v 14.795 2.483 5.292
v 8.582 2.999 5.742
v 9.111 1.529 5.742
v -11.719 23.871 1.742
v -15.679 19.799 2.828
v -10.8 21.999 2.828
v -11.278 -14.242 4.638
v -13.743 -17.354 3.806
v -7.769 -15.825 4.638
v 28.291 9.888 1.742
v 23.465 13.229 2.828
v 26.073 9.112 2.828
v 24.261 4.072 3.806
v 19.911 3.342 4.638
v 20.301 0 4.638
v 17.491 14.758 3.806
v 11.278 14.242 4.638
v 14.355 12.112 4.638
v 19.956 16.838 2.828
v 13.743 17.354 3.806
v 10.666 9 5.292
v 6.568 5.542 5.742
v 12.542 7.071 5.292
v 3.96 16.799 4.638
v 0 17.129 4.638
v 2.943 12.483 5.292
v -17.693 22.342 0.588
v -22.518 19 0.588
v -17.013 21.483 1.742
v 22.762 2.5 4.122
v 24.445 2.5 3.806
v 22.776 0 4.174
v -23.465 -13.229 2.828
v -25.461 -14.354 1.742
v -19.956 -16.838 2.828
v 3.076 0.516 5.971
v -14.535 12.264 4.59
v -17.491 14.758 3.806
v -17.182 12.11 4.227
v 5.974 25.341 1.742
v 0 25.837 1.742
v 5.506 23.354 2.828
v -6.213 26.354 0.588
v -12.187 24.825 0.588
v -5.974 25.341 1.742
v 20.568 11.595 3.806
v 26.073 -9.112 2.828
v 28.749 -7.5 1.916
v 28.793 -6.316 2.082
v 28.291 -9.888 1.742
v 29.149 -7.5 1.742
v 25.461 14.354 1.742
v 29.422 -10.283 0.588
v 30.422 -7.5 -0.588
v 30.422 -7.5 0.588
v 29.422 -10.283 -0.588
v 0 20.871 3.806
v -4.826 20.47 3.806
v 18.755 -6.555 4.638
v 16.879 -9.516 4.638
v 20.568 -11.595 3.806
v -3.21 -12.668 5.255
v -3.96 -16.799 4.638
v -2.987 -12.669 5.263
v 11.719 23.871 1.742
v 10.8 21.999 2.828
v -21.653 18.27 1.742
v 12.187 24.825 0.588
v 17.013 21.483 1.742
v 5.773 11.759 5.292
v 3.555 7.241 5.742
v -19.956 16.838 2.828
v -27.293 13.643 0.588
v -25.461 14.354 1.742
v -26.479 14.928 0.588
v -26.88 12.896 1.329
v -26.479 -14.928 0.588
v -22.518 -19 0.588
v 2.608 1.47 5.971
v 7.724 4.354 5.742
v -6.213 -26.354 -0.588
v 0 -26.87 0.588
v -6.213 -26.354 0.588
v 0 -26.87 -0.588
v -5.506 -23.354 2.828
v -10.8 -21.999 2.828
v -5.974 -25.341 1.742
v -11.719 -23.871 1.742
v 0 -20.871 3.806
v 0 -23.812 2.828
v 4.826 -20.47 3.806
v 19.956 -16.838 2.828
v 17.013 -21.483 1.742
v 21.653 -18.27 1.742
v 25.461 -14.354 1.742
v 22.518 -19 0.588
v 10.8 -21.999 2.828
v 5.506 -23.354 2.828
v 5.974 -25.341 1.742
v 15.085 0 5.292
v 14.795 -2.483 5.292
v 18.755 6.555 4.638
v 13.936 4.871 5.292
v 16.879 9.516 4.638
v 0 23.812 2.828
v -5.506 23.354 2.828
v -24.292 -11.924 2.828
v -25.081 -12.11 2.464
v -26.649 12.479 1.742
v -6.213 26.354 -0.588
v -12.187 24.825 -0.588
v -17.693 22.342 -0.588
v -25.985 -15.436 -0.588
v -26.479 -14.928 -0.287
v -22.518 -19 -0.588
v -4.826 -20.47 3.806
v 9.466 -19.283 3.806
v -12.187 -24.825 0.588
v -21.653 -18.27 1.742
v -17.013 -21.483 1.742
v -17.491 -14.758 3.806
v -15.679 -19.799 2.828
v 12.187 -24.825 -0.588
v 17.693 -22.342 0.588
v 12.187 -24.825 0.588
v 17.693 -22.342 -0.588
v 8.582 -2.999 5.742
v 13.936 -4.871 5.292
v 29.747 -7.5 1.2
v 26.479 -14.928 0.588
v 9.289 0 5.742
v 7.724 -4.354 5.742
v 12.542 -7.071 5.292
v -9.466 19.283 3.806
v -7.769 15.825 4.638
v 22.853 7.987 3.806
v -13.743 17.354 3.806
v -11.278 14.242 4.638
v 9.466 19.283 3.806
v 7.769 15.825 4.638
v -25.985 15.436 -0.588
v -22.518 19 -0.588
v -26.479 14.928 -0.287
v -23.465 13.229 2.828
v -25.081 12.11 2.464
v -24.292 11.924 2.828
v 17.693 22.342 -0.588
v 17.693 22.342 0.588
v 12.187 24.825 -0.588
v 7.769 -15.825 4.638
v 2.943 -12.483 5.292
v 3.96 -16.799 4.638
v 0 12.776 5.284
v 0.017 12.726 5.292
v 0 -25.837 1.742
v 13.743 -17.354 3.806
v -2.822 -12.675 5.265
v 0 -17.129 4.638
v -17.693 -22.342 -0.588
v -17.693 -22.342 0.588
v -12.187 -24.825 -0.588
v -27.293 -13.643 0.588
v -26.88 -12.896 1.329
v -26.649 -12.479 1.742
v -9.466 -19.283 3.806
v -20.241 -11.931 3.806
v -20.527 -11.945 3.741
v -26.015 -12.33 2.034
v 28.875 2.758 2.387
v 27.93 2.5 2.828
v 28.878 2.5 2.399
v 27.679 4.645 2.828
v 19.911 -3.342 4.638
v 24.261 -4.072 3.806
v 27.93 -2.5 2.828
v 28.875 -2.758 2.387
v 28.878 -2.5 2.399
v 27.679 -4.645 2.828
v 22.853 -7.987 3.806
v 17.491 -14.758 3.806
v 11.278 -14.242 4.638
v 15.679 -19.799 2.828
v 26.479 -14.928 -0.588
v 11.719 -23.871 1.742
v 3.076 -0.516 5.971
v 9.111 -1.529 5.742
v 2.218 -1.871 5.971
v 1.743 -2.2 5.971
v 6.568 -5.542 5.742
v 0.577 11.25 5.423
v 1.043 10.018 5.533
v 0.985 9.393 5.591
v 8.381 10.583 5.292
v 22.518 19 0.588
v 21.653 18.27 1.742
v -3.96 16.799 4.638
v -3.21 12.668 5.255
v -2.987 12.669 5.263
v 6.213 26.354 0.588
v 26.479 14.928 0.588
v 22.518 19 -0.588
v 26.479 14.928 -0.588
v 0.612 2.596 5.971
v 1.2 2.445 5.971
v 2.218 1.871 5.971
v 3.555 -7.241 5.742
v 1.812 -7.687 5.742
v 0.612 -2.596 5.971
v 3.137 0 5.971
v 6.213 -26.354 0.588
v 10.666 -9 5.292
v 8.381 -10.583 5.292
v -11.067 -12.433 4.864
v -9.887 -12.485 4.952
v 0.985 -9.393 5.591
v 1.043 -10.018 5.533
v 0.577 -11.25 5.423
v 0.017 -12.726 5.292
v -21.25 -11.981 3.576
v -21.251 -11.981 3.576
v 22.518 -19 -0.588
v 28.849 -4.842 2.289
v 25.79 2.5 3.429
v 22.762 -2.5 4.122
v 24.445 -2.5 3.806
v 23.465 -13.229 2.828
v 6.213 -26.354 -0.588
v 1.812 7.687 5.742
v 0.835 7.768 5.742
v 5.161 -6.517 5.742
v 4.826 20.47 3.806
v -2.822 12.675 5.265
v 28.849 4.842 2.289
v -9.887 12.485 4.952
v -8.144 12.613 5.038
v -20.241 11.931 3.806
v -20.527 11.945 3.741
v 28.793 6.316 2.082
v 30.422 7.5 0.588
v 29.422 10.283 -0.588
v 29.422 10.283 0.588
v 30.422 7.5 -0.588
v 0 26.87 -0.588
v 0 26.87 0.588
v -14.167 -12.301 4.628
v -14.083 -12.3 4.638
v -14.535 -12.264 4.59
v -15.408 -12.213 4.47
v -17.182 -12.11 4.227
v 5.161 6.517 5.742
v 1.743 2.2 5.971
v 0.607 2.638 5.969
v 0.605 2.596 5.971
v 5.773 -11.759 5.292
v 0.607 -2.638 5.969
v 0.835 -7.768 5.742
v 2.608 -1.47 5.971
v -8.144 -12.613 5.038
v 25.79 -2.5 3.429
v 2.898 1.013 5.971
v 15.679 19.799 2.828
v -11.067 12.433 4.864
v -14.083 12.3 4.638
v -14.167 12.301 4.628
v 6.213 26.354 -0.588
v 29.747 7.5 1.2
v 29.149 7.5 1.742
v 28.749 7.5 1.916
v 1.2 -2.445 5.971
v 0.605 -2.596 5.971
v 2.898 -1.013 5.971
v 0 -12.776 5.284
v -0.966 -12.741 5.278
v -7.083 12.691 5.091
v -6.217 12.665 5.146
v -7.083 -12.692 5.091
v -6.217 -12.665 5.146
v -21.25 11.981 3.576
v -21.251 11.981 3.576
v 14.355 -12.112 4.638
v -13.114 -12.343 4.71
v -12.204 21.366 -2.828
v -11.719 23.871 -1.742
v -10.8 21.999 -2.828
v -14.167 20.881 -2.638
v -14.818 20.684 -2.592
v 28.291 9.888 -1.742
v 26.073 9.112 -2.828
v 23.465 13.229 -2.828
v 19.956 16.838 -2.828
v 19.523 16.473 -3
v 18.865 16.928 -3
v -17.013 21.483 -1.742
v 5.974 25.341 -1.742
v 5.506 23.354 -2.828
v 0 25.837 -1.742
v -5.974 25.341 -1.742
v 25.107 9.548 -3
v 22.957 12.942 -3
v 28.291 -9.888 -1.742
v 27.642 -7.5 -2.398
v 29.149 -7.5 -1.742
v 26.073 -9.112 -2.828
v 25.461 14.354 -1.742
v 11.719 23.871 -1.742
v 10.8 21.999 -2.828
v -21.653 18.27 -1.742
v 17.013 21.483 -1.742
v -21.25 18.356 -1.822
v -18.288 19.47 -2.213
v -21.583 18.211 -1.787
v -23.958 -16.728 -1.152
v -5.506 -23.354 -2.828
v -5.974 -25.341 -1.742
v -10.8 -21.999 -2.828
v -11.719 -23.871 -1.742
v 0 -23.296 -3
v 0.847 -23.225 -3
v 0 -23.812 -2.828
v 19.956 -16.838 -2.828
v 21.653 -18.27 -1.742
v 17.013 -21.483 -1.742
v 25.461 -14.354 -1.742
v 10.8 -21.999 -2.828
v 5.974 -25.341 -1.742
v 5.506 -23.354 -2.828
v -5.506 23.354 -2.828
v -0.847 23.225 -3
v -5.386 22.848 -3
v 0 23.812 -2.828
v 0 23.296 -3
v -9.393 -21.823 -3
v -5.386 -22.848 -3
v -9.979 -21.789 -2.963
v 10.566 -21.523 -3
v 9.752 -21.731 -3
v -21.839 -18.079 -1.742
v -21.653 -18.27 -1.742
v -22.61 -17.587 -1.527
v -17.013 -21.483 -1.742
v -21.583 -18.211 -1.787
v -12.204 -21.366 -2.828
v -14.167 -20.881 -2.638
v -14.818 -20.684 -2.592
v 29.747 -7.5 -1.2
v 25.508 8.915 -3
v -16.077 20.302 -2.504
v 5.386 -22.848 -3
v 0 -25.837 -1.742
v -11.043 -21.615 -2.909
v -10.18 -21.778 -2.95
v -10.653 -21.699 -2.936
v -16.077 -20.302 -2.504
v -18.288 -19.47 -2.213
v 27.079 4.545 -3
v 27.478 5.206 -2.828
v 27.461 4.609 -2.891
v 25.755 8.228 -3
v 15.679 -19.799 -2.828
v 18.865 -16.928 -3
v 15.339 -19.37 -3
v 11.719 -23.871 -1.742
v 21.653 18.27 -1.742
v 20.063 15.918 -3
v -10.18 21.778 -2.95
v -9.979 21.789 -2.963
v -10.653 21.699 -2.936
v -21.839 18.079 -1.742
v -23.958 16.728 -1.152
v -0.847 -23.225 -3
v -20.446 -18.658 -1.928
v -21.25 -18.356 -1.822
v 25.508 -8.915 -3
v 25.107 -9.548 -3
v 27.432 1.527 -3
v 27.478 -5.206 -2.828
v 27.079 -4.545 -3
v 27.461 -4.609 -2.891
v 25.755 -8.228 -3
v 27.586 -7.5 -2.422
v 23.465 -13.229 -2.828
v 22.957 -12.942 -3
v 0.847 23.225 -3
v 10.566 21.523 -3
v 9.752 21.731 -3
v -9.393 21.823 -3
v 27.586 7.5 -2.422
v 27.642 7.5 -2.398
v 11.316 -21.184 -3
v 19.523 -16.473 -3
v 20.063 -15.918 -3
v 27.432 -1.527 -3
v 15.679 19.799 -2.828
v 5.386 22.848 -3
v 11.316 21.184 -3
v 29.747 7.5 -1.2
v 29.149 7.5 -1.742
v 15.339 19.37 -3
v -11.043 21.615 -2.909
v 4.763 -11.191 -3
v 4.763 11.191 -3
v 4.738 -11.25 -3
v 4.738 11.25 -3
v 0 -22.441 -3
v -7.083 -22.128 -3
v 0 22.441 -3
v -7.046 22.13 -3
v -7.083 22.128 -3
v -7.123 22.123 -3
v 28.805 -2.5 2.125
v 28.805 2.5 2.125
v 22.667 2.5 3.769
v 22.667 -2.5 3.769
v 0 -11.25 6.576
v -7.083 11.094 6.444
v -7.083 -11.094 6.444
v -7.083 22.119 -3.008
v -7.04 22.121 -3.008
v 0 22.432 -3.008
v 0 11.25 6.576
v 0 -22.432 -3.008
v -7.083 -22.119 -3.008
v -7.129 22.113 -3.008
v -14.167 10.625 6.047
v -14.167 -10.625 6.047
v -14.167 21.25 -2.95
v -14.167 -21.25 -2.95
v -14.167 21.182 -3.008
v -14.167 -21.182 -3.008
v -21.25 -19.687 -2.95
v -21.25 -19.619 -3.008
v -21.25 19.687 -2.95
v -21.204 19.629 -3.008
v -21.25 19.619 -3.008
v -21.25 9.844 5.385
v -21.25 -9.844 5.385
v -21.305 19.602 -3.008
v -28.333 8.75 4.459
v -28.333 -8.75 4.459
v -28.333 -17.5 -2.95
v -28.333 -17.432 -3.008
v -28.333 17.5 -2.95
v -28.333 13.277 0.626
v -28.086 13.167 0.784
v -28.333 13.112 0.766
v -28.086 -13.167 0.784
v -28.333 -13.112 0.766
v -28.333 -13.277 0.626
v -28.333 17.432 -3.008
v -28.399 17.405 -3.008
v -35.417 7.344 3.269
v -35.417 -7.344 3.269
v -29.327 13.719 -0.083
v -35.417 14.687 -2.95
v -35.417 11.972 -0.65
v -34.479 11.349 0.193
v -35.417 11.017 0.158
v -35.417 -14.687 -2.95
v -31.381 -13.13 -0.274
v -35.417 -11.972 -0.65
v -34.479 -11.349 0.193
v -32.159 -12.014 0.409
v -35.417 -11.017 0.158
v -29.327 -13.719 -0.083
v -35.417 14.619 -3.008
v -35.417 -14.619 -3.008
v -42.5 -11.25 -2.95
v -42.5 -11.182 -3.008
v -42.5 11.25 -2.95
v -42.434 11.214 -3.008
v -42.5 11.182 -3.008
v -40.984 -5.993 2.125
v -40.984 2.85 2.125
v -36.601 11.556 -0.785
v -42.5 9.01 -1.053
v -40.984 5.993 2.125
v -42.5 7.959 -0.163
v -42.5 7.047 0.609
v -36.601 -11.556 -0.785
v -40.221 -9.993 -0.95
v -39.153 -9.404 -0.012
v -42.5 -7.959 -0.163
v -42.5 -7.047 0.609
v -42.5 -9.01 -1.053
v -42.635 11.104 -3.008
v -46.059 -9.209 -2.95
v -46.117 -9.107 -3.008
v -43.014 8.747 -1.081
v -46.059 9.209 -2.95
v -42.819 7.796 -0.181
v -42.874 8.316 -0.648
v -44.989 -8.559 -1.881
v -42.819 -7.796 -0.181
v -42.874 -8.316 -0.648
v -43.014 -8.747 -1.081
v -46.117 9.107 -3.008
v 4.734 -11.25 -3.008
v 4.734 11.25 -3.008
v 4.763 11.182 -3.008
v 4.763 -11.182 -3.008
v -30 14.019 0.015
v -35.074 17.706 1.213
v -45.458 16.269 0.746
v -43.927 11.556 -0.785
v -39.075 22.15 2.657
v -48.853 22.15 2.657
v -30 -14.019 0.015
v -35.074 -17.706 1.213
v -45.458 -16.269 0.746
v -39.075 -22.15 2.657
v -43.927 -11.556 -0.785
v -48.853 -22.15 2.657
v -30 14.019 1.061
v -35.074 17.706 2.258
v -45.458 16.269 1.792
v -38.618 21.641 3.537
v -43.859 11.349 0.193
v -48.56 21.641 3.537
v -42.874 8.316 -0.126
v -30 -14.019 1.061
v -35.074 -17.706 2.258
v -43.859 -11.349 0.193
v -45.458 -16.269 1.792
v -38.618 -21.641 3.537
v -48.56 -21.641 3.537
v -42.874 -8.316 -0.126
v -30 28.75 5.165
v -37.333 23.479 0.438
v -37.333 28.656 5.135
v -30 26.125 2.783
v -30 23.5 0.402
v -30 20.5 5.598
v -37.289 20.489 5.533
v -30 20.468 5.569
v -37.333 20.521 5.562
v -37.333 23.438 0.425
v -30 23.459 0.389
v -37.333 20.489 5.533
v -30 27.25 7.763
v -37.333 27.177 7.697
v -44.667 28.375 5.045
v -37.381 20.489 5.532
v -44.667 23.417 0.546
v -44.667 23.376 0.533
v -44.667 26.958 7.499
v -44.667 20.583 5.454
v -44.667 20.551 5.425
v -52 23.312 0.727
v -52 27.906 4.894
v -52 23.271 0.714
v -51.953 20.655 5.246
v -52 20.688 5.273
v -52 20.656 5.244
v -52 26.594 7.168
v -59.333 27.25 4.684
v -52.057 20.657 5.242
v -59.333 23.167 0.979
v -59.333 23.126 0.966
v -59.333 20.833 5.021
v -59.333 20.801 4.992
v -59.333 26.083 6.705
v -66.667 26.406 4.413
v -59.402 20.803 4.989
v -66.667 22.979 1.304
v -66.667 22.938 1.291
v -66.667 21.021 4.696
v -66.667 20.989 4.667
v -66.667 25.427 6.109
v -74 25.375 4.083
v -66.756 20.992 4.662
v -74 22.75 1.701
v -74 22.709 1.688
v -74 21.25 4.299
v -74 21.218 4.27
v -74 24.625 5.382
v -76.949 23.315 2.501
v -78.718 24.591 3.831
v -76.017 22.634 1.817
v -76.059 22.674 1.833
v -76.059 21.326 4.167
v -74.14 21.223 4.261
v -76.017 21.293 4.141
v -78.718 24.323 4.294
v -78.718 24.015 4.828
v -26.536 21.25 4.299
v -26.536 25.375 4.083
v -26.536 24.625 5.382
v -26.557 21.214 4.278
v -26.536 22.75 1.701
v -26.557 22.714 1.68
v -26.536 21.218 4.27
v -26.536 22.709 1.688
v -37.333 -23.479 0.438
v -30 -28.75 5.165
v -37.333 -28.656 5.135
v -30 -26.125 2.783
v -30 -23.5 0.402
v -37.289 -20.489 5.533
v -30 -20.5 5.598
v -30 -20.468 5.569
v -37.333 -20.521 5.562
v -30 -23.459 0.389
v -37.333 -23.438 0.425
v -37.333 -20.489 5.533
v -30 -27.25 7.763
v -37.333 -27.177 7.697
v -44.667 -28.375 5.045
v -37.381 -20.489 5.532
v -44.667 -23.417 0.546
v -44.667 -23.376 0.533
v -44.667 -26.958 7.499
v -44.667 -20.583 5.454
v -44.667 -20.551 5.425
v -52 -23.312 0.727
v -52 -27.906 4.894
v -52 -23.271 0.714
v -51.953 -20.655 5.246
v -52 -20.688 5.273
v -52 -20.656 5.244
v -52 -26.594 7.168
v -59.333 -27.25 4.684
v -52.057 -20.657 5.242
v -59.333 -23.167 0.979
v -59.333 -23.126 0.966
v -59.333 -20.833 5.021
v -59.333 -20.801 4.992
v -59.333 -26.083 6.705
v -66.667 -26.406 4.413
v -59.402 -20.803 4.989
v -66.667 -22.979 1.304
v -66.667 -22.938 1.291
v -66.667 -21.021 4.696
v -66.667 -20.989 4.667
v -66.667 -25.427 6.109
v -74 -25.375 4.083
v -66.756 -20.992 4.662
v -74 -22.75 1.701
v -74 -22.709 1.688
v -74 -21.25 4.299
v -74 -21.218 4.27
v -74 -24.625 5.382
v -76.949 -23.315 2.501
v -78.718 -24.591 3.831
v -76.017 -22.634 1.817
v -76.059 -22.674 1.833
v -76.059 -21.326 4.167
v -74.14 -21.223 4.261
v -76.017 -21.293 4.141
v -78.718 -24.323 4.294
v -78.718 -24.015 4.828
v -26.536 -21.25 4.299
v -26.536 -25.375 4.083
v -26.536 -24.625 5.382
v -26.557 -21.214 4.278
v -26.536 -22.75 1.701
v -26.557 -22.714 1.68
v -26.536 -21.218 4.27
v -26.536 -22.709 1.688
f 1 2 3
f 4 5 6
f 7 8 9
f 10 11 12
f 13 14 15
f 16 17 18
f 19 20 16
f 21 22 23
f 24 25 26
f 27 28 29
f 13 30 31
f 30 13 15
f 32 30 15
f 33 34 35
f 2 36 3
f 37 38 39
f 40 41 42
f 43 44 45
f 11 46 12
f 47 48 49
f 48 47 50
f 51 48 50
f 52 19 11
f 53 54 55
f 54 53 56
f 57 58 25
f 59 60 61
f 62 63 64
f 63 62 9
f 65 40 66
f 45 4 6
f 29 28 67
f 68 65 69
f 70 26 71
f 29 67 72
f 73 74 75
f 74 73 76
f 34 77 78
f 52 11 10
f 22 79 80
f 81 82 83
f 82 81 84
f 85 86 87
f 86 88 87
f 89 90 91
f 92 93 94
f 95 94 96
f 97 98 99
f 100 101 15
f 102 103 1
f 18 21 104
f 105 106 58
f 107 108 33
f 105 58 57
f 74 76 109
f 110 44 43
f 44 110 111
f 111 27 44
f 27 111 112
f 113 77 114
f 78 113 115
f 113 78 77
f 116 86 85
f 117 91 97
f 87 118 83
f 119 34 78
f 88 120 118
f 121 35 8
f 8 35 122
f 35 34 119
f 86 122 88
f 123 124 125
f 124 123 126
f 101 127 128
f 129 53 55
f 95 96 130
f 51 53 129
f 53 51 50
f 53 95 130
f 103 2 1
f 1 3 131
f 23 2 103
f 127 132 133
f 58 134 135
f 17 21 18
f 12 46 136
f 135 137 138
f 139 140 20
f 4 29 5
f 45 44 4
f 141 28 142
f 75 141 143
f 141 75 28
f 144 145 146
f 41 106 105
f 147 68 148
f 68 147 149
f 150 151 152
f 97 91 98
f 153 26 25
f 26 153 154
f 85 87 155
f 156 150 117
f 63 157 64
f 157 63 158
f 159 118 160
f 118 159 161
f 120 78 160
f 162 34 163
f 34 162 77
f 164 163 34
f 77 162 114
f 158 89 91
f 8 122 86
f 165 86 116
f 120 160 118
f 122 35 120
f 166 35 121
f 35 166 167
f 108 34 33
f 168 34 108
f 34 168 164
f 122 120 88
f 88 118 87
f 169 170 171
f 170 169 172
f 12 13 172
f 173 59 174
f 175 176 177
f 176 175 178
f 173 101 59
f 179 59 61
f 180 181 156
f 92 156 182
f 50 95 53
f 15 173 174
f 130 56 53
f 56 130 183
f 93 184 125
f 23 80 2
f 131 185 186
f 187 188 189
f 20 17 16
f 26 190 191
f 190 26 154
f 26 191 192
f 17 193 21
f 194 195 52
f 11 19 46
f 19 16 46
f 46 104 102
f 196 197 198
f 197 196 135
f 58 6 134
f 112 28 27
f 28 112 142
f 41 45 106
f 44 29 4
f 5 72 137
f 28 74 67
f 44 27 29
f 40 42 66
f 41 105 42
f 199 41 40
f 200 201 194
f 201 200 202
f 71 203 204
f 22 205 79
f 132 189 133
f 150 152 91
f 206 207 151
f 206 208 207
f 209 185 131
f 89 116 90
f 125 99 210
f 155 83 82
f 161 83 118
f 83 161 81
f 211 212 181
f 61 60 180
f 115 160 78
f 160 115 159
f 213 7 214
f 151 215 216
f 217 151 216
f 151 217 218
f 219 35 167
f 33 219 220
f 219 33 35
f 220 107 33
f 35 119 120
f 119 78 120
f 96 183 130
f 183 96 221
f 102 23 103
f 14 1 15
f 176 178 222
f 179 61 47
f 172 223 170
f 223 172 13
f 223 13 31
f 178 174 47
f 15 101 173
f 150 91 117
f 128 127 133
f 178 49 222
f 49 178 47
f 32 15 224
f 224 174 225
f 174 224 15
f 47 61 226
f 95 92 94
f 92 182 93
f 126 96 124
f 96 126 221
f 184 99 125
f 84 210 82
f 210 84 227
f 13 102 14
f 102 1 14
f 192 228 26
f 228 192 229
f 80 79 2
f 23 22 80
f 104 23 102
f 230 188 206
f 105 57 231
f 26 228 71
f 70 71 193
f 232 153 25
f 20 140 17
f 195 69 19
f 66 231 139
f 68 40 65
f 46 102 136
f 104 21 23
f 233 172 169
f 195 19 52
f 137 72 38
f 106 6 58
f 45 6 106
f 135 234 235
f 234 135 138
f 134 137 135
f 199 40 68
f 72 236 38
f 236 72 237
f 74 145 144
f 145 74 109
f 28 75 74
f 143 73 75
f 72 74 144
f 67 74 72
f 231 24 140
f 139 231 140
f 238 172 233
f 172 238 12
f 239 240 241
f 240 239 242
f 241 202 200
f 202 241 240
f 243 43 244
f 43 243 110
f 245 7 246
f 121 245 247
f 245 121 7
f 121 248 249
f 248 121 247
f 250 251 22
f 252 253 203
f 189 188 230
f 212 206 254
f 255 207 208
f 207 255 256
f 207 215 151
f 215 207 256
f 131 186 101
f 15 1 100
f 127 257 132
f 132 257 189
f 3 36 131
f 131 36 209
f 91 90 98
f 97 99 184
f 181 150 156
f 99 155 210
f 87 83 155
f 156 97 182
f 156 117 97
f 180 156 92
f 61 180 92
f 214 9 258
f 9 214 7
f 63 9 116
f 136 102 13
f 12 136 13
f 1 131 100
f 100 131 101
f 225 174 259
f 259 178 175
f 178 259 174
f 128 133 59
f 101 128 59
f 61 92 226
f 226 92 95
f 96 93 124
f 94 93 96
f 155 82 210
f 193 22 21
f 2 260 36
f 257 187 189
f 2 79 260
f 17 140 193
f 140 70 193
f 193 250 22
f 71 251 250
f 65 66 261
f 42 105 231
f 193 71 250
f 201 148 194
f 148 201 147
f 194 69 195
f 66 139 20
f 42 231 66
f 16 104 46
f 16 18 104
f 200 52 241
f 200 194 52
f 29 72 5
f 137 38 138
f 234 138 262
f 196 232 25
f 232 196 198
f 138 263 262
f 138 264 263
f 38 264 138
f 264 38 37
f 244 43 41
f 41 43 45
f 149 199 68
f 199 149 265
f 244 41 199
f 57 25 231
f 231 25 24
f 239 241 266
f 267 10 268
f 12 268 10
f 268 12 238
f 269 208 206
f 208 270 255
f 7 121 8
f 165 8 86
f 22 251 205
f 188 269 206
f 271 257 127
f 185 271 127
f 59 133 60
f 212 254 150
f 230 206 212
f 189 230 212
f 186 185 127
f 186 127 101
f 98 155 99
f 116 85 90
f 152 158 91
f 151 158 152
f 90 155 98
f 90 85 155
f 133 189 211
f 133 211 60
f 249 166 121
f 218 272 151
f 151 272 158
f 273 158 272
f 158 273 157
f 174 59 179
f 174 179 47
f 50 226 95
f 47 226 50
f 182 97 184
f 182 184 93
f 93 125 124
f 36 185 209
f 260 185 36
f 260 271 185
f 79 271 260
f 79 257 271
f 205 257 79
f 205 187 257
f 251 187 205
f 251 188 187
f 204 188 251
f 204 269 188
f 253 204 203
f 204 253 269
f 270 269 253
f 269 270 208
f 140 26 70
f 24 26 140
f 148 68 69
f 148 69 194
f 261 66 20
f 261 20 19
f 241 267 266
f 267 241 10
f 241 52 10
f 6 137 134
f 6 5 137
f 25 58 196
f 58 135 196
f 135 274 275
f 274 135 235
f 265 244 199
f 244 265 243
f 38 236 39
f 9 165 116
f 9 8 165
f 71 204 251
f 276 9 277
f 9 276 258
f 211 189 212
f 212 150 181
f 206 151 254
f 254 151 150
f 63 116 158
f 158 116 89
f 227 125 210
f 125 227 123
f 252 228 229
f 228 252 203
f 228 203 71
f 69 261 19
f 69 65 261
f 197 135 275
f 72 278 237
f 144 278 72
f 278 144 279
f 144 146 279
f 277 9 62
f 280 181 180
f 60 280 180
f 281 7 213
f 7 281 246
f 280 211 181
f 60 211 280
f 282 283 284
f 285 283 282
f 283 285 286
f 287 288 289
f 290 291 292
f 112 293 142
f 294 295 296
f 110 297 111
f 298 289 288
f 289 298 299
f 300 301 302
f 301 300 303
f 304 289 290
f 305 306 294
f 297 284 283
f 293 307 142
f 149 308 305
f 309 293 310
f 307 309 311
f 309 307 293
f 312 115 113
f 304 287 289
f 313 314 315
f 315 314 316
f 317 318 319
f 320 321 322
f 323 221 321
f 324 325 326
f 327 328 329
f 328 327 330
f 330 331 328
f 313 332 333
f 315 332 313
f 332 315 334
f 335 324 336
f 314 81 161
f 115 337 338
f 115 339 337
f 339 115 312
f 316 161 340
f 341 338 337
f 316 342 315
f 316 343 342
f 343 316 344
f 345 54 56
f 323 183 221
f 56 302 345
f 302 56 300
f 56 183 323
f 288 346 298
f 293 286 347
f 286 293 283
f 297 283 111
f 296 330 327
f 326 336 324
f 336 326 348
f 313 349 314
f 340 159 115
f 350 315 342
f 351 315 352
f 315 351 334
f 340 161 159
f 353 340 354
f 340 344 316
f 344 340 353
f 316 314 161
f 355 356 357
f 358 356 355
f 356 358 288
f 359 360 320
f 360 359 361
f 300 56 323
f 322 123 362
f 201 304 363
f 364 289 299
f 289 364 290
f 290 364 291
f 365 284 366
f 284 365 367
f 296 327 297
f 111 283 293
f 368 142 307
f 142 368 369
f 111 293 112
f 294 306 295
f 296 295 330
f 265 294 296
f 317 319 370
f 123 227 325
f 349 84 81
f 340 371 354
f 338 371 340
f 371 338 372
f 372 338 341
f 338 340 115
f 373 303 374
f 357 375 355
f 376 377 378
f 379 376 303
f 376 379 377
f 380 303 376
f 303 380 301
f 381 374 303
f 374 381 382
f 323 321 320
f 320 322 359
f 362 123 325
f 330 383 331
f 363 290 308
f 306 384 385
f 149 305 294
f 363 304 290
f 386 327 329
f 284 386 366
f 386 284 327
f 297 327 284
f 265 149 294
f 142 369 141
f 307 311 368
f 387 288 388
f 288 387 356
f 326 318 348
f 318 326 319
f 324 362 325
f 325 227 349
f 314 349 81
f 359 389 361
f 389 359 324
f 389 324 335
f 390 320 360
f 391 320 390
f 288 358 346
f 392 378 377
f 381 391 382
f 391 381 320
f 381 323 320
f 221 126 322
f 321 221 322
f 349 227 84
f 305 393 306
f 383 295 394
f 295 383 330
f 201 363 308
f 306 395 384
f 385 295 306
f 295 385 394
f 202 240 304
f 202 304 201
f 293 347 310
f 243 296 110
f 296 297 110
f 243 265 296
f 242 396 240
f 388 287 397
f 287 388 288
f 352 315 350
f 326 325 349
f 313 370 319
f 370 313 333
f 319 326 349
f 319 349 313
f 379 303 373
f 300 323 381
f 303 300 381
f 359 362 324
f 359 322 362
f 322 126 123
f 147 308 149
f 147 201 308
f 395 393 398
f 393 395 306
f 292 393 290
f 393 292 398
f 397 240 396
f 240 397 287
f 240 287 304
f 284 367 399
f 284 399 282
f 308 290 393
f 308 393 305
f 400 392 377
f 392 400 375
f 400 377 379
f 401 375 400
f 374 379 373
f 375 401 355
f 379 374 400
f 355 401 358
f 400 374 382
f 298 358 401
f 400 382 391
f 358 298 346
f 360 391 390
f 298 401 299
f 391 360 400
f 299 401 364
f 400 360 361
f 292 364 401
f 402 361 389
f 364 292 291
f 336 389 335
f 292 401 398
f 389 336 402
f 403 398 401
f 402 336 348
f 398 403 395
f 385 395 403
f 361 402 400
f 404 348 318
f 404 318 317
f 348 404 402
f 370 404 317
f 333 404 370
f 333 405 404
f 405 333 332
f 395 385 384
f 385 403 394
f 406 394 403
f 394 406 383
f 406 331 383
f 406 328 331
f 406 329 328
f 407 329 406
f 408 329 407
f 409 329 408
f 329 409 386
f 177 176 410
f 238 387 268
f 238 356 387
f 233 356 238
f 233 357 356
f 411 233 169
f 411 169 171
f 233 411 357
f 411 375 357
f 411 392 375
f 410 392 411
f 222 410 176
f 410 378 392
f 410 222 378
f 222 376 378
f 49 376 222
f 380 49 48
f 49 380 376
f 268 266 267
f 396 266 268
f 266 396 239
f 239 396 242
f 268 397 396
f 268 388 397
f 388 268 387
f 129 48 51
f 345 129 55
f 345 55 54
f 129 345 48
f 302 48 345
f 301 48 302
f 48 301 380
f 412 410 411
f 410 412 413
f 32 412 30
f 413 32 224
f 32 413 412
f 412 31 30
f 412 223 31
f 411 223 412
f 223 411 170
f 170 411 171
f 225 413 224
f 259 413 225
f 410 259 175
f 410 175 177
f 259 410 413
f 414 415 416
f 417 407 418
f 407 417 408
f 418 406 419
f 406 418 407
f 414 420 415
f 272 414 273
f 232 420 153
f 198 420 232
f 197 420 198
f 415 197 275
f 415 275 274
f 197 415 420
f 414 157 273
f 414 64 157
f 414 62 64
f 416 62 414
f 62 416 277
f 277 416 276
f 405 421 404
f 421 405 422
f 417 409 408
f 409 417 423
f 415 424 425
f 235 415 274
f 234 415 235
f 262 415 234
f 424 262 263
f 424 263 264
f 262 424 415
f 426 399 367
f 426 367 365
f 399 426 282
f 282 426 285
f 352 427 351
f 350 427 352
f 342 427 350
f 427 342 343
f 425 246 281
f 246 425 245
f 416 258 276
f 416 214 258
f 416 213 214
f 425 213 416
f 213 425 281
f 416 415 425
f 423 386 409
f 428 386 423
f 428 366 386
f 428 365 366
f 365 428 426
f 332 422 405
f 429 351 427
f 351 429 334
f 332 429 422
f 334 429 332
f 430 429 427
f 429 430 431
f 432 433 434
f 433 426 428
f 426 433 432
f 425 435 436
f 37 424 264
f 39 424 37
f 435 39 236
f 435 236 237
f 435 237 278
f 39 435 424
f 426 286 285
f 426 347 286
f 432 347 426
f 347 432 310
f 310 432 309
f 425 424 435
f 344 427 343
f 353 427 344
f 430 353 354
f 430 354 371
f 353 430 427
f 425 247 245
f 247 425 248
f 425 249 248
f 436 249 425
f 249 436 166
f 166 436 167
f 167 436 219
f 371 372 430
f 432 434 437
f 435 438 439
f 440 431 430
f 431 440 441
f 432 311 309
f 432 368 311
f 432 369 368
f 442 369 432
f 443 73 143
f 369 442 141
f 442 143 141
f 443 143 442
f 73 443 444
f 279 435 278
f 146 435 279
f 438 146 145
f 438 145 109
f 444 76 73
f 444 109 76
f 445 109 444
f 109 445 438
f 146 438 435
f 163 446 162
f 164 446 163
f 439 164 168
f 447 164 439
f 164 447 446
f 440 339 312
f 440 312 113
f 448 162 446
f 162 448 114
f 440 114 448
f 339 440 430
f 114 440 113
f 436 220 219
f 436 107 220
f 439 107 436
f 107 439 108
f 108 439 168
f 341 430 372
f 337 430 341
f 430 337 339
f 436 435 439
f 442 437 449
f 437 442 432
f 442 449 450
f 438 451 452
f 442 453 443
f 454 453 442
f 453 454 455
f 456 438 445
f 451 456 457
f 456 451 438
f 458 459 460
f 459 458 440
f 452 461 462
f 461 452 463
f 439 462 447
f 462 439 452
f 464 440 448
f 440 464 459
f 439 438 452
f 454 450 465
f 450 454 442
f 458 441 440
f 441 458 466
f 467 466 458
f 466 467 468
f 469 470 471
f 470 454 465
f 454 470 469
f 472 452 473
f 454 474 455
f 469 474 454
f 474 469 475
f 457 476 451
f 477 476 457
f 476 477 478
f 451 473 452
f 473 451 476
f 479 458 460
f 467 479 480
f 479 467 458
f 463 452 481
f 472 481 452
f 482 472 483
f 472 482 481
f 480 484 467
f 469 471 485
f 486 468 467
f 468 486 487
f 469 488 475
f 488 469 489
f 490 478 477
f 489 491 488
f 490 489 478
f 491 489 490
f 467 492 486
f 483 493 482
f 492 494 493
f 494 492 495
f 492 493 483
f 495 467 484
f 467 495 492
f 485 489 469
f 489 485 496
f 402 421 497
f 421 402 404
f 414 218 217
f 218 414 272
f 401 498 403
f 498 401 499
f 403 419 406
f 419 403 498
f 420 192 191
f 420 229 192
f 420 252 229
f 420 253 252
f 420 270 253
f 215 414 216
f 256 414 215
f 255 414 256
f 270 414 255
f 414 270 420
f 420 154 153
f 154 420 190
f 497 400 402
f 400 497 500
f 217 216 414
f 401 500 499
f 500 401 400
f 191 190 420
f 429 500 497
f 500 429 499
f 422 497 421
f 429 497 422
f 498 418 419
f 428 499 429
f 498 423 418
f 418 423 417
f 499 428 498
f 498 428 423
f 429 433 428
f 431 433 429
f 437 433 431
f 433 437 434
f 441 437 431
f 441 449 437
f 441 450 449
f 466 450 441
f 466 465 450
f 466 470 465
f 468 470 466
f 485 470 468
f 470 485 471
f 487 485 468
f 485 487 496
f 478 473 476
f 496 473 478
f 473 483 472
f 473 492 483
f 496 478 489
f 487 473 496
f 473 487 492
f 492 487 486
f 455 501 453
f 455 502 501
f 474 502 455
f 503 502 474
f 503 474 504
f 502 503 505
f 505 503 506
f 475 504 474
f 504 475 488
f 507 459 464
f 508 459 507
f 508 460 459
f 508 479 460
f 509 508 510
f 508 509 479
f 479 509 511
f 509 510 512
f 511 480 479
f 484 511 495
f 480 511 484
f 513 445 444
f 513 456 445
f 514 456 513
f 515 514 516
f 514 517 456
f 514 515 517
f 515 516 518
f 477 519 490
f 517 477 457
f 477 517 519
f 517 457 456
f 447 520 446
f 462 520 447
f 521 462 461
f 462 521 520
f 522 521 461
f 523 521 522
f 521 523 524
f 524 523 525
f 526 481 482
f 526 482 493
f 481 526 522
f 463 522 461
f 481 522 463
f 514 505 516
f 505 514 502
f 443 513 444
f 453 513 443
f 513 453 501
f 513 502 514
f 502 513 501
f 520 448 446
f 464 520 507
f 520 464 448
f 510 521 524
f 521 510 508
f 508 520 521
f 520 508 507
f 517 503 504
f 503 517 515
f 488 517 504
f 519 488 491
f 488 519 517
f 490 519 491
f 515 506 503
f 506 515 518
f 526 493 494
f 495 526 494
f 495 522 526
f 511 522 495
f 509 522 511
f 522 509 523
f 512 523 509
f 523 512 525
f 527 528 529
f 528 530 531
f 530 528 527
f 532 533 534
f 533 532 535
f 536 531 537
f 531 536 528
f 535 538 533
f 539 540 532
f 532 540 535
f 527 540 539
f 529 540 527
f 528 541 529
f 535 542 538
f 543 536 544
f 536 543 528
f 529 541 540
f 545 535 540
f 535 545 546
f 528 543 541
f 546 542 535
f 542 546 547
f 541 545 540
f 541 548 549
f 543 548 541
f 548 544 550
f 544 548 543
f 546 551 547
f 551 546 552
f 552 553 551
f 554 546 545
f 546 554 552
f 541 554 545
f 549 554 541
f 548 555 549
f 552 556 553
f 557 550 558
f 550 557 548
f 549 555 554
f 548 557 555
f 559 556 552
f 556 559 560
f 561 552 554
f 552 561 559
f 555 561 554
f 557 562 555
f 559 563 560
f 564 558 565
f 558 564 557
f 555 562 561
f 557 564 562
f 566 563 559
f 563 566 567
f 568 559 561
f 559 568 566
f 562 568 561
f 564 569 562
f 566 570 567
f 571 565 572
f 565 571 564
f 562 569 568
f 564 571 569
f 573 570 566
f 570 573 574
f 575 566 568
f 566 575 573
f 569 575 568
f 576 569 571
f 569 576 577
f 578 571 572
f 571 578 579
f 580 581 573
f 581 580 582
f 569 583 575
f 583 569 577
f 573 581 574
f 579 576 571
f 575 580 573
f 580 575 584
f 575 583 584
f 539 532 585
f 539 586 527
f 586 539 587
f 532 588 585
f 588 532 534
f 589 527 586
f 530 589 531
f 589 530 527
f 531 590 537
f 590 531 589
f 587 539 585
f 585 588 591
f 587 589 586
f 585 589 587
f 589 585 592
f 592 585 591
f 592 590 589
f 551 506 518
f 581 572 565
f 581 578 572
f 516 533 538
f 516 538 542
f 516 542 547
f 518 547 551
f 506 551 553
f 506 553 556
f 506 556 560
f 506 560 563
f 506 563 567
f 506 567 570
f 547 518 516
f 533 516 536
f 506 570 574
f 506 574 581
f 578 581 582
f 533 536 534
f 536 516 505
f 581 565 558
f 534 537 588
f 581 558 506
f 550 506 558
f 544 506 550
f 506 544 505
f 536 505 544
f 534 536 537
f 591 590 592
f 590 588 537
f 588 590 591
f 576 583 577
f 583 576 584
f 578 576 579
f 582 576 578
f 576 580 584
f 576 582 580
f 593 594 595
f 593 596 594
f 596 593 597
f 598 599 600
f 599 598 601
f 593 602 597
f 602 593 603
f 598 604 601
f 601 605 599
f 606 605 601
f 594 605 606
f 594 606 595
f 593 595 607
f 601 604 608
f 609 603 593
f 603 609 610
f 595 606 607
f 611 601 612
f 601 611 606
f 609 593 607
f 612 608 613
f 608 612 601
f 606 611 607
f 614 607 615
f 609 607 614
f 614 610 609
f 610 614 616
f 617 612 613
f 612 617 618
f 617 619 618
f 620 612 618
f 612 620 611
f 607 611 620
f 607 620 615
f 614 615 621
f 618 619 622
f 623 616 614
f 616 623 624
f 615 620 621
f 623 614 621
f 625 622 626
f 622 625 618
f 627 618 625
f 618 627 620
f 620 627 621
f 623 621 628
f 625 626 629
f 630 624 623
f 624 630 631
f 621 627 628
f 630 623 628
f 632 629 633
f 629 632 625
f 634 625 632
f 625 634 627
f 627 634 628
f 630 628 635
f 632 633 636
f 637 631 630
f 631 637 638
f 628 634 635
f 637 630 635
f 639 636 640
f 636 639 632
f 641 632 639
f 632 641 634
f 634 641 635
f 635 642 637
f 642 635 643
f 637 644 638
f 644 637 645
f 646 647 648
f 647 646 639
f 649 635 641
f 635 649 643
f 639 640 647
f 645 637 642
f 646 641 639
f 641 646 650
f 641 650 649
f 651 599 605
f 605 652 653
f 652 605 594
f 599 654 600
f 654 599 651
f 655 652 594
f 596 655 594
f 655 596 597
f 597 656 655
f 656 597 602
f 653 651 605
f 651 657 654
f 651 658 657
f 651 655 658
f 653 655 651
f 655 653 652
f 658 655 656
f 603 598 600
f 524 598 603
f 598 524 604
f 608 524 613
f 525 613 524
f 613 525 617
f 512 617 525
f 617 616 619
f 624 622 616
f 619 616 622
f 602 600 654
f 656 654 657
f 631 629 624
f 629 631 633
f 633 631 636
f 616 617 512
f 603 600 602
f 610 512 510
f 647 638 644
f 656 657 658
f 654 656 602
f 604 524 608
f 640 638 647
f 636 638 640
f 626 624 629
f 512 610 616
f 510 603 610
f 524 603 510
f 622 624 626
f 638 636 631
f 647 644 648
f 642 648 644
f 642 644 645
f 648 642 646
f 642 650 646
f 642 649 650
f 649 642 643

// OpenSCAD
// file: util.scad
fn1 = 32;
fn2 = 16;

module util_half_sphere(radius, fn=fn1) {
    difference() {
        sphere(radius, $fn=fn);
        translate([0,0,-(radius+radius/19)])
            cube(2*radius+radius/10, center=true);
    }
}

function gcd(a,b) = a == b ? a : a > b ? gcd(a-b, b) : gcd(a, b-a);

module util_saucer(length, width, height, fn=fn1) {
    rad = gcd(length,gcd(width,height));
    //rad = 10;
    scale([length/(2*rad), width/(2*rad), height/rad])
        util_half_sphere(rad, fn);
}

module util_half_cylinder(length, radius, inner_fn=fn2, outer_fn=fn1) {
    maxval = max(length, 2*radius);
    intersection() {
        difference() {
            rotate([0,90,0])
                translate([0,0,-(length/2 + length/20)])
                    cylinder(length+length/10, radius, radius, $fn=inner_fn);
            
            translate([0,0,(maxval/2 + maxval/19)])
                cube(maxval+maxval/10, center=true);
        }
        
        translate([0,0,-(radius+radius/20)])
            cylinder(radius + radius/10, length/2, length/2, $fn=outer_fn);
    }
}

module util_body(length, width, height, upper_height, fn=fn1) {
    rad = gcd(length, gcd(width, upper_height));
    
    scale(.995) scale([length/(2*rad), width/(2*rad), 1])
        util_half_cylinder(2*rad, height, outer_fn=fn);
}

module util_graded_cylinder(height, radius_start, radius_end, grades=1, fn=fn1) {
    height_grade = height / grades;
    radius_grade = (radius_start - radius_end) / (grades * grades);
    for (i = [0 : 1 : grades]) {
        translate([0,0,i*height_grade])
            cylinder(height_grade, 
                     radius_start - i*radius_grade * i,
                     radius_start - (i+1) * radius_grade * (i+1),
                     $fn = fn);
    }
}

module util_nacelle(length, width, height, curved=false, up=true, front_bulge=false) {
    rad = min(width, height/2);
    grads = curved ? 6 : 1;
    scale_factor = front_bulge ? 1.1 : 1;
    direction = up ? -1 : 1;
    difference() {
        scale([1, width/ (2*rad), height/rad])
            difference() {
                union() {
                    rotate([0,-90,0])
                        rotate(30)
                            util_graded_cylinder(length-rad, rad, rad/2, grads, 6);
                    scale(scale_factor) 
                        rotate([0,90,0]) rotate(90) sphere(rad, $fn=6);
                }
                
                translate([-length/2, 0, direction * (height/2 + height/19)])
                    cube([length+length, width+width, height+height/10], center=true);
            }
        
        translate([-length-(curved?length/3:0), 0, -length/3])
            rotate([0,-45,0])
                cube(length, center=true);
    }
}

module util_mirrored(v) {
    children();
    mirror(v) children();
}

module util_ring(outer, inner, height) {
    difference() {
        translate([0,0,-height/2])
            cylinder(height, outer, outer);
        translate([0,0,-(height/2 + height/19)])
            cylinder(height+height/10, inner, inner);
    }
}

module util_star(radius, thick, num, half=false) {
    angle = 360/num;
    offset = half? angle/2 : 0;
    for (i = [0: 1: num]) {
        rotate(i* angle + offset)
            translate([radius/2,0,0])
                cube([radius, thick, thick], center=true);
    }
}

module util_ring_star(radius, thick, num, inner, half=false) {
    outer=inner+thick;
    avg = (inner + outer)/2;
    union() {
        difference() {
            util_star(radius, thick, num, half);
            cylinder(2*thick, outer, outer, $fn=num, center=true);
        }
        util_ring(outer, inner, thick);
    }
}

module util_hangar_disk(height, lower, upper, num, fn=fn1) {
    difference() {
            cylinder(height, lower, upper, $fn=fn, center=true);
        difference() {
            scale([1,1,22])
                util_star(1.1*upper, height/20, num, half=true);
            scale(.95)
                cylinder(height, lower, upper, $fn=fn, center=true);
        }
    }
}

module util_hangar_form(length, width, height, num, inner=0) {
    l = 0.6* max(length, width);
    h = 2.5* height;
    thick = min(height/20,1);
    inner = inner == 0 ? l/3 : inner;
    difference() {
        children();
        scale([1,1,h/thick]) 
            util_ring_star(l, thick, num, inner, half=true);
    }
    scale(.95) children();
}

module util_nacelle_bar(span, height, width, thickness) {
    rad = (span*span/(8*height) + height/2);
    outer = rad + thickness/2;
    inner = rad - thickness/2;
    difference(){
        translate([0,0,outer])
            rotate([0,90,0])
                util_ring(outer, inner, width);
    
        translate([0,0,1.1*outer+height])
            cube(2.2*outer, center=true);
    }
}
// main file
use <util.scad>;

module tactical_shuttle() {
    difference() {
        util_saucer(9,9,2.25);

        translate([3,0,2])
            rotate([0,-66,0])
                cube([1.5,1.5,3],center=true);
    }

    translate([-3.5,0,1])
        scale([1,1,.5])
            rotate([90,0,0])
                cylinder(5,2,2,$fn=6,center=true);

    util_mirrored([0,1,0])
        translate([-4,1.5,1])
            rotate([90,0,0])
                util_nacelle(7.5,1,4,curved=true,up=false);
};


module runabout_old() {
    difference() {
        util_saucer(18,15,3);

        translate([6,0,3.3])
            rotate([0,-72,0])
                cube([3,3,5],center=true);
    }

    translate([-7.5,0,0])
        scale([1,1,.4])
            rotate([90,0,0])
                cylinder(9,4,4,$fn=6,center=true);

    translate([-7.5,0,1])
        mirror([0,0,1])
            util_nacelle_bar(15,2.5,2.5,.5);

    util_mirrored([0,1,0])
        translate([-3,6.5,-2])
            scale([1,1,.5])
                union() {
                    rotate([0,90,0])
                        cylinder(14,1.5,1.5,center=true,$fn=16);

                    util_mirrored([1,0,0])
                        translate([7,0,0])
                            sphere(1.5,$fn=16);
                }
}

module yacht() {
    difference() {
        util_saucer(27,27,3.5);

        translate([10,0,3])
            rotate([0,-75,0])
                cube([3,3,5],center=true);
    }

    translate([-13,0,0]) {

        difference(){
            mirror([0,0,1])
                util_saucer(16,8,2.5);

            translate([-4,0,-2.5])
                scale([1.5,1,1])
                    rotate([90,0,0])
                        cylinder(10,2.5,2.5,center=true,$fn=16);
            
            translate([-9,0,-5])
                cube(10,center=true);
            
            translate([7.5,0,-1.25])
                rotate([0,90,0])
                    cylinder(4,.5,1,$fn=16, center=true);
        }

        util_saucer(16,8,1.5);
    }

    translate([-11,0,0])
        difference() {
            util_nacelle_bar(25,2.5,27,.25);
            
            translate([-29.5,0,0])
                cylinder(40,20,20,center=true);

            util_mirrored([0,1,0])
                translate([11,25,0])
                    cylinder(40,25,25,center=true);
        }

    util_mirrored([0,1,0])
        translate([-14,11,2.5])
            util_nacelle(20,4,2,curved=true);
}


module science_runabout() {
    difference() {
        util_saucer(36,36,4);

        translate([15,0,3])
            rotate([0,-75,0])
                cube([3,3,5],center=true);
    }

    translate([-13,0,0]) difference() {
        scale([1.5,1,1.2])
            rotate([90,0,0])
                cylinder(15,4,4,$fn=6,center=true);
        
        translate([0,0,-10]) cube(20,center=true);
    }
    
    translate([-15,0,1])
        util_nacelle_bar(28,2.5,3,.5);
    
    util_mirrored([0,1,0])
        translate([-8,12,3])
            util_nacelle(24,4,2,curved=true);
}


module attack() {
    difference() {
        util_saucer(45,45,5);

        translate([20,0,3])
            rotate([0,-70,0])
                cube([3,3,5],center=true);
        
    }

    difference() {
        scale([1,1,2.5])
            util_body(45,45,1.5,6);
    
        translate([22.5,0,-1.2])
            sphere(1,$fn=16);
    }

    util_mirrored([0,1,0])
        translate([-12,12,-2.5])
            rotate([75,0,0])
                util_nacelle(40,5,12,curved=true,up=false);

    difference() {
        translate([-10,0,0])
            mirror([0,0,1])
                util_nacelle_bar(35,3.2,20,2);

        util_mirrored([0,1,0])
            translate([2,18,0])
                cylinder(15,15,15,center=true);
        
        translate([-38,0,0]) cylinder(15,22.5,22.5,center=true);
    }
}

module scout_old() {
    difference() {
        util_saucer(54,54,5);

        translate([24,0,3])
            rotate([0,-70,0])
                cube([3,3,5],center=true);
    }

    translate([-36,0,0]) 
    scale([1.33,.66,1]) {
        difference() {
            cylinder(8,8,32,center=true,$fn=4);
            translate([-35,0,0])
                cube(60,center=true);
        }

        difference() {
            cylinder(8,54,32,center=true,$fn=4);
            translate([-35,0,0])
                cube([60,200,60],center=true);
            translate([35,0,0])
                cube([60,200,60],center=true);
            translate([0,0,-60])
                cube(120,center=true);
        }
    }

    util_mirrored([0,1,0])
        translate([-24,24,1.5])
            rotate([-110,0,0])
                util_nacelle(45,4,8,curved=true);

    translate([0,0,.1])
    util_nacelle(42,32,6.7,curved=true);
}

module science() {
    difference() {
        util_saucer(50,24,7.5);
        
        union() {
            cube([50,15,4], center=true);
            translate([0,0,1.5])
                cube([50,18,1], center=true);
            util_mirrored([1,0,0])
            translate([16,0,1.5])
            cube([15,24,1],center=true);
            translate([-20,0,6.8])
                scale([1.5,1,1.5])
                rotate([90,0,0])
                    cylinder(24,6,6,center=true,$fn=6);
//            translate([-14,0,-2])
//                rotate([90,0,0])
//                    cylinder(24,6,6,center=true,$fn=6);
            translate([22,0,4])
                rotate([0,-57,0])
                    cube([2,2,4], center=true);
//            util_mirrored([0,1,0])
//                translate([0,14,-.1])
//                    scale([1,1.5,1])
//                    rotate(90)
//                        rotate([90,0,0])
//                            cylinder(40,3,3,center=true,$fn=6);
        }
    }
}

module runabout() {
    rotate([0,180,0]) {
        scale([1,1,.33])
            util_nacelle(20,12,9, curved=true);
        scale([1,1,.33])
            util_nacelle(20,12,9, curved=true, up=false);
        util_mirrored([0,1,0])
            rotate([90,0,0])
                util_nacelle(18,2,8,curved=true, up=false);
    }
}

module scout() {
    difference() {
        util_mirrored([0,0,1]) 
            util_saucer(64,54,6);

        translate([0,0,-43]) 
            cube(80, center=true);

        translate([36,0,0])
            rotate([0,15,0])
                cube(15,center=true);
        
        translate([35,0,1.5])
            rotate([0,15,0])
                cube([25,5,2],center=true);
    }
    

    
    translate([0,0,-2.95])
        mirror([0,0,1]) {
            util_nacelle(48,45,11,curved=true,up=false);
            
        }
    
    difference() {
        translate([-32,0,-2])
            util_nacelle_bar(50,6,40,1);
    
        translate([-82,0,0])
            cylinder(20,40,40,center=true);
    
        util_mirrored([0,1,0])
            translate([-15,40,0])
                cylinder(20,30,30, center=true);
    }
    
    util_mirrored([0,1,0])
        translate([-30,22,3])
            rotate([-60,0,0])
                util_nacelle(48,6,8,curved=true);
}

scout();
